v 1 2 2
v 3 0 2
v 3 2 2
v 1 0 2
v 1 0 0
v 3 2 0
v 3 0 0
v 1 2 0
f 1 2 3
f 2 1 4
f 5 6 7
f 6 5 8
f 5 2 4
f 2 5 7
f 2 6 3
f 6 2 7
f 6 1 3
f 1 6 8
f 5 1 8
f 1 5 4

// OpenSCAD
!translate([1,0,0]) !cube(2);
sphere(1);
!union() { !cube(); sphere(); }
